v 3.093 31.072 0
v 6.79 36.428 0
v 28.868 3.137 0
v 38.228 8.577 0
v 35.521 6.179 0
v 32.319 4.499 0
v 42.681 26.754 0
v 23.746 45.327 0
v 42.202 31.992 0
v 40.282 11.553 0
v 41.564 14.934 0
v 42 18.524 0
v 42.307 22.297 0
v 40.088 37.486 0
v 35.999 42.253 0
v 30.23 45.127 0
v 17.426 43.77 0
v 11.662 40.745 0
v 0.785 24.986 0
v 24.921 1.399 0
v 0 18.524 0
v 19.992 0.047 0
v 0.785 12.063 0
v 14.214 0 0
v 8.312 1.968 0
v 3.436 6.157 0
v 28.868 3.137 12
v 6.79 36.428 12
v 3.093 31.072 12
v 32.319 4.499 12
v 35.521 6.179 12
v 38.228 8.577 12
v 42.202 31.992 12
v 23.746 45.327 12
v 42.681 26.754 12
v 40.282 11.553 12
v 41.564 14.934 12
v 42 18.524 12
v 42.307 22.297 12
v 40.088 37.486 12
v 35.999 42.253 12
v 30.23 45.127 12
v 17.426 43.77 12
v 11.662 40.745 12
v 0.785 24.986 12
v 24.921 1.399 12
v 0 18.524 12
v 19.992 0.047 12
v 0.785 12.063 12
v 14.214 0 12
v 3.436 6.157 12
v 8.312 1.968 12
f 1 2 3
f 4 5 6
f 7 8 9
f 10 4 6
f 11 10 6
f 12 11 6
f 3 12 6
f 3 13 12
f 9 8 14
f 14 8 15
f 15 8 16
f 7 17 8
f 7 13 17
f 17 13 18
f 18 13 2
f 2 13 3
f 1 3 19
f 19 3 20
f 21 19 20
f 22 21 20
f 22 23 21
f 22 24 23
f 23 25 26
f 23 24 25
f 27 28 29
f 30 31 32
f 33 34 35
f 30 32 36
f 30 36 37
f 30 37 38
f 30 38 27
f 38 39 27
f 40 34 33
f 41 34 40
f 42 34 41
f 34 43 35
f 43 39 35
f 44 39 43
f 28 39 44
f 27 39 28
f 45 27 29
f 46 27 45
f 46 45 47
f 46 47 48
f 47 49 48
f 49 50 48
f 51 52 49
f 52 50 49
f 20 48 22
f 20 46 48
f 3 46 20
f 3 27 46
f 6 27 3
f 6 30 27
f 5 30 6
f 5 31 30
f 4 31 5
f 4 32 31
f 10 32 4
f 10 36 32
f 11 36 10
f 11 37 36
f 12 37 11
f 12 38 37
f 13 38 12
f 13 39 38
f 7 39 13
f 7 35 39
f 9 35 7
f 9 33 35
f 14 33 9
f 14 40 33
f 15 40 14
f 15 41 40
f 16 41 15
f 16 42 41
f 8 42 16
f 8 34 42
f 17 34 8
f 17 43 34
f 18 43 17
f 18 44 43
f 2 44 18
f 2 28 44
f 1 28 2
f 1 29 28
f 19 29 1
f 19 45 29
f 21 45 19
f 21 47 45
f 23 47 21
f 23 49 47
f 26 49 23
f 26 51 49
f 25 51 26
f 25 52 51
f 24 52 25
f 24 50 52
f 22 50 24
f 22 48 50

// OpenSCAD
$fn = 32;

// ----------------------------------------------------------------------
// Cam disc: base radius 15.0 mm, lift 12.0 mm, 26 profile points
// ----------------------------------------------------------------------

// --- parameters (mm) ---
profile_height = 12;      // extrusion height
profile_points = 26;      // points of the closed outline

profile = [[42, 18.524], [42.307, 22.297], [42.681, 26.754], [42.202, 31.992], [40.088, 37.486], [35.999, 42.253], [30.23, 45.127], [23.746, 45.327], [17.426, 43.77], [11.662, 40.745], [6.79, 36.428], [3.093, 31.072], [0.785, 24.986], [0, 18.524], [0.785, 12.063], [3.436, 6.157], [8.312, 1.968], [14.214, 0], [19.992, 0.047], [24.921, 1.399], [28.868, 3.137], [32.319, 4.499], [35.521, 6.179], [38.228, 8.577], [40.282, 11.553], [41.564, 14.934]];  // single closed polygon, 26 points, counter clockwise

// --- the one profile operation ---
linear_extrude(height = profile_height) polygon(points = profile);
